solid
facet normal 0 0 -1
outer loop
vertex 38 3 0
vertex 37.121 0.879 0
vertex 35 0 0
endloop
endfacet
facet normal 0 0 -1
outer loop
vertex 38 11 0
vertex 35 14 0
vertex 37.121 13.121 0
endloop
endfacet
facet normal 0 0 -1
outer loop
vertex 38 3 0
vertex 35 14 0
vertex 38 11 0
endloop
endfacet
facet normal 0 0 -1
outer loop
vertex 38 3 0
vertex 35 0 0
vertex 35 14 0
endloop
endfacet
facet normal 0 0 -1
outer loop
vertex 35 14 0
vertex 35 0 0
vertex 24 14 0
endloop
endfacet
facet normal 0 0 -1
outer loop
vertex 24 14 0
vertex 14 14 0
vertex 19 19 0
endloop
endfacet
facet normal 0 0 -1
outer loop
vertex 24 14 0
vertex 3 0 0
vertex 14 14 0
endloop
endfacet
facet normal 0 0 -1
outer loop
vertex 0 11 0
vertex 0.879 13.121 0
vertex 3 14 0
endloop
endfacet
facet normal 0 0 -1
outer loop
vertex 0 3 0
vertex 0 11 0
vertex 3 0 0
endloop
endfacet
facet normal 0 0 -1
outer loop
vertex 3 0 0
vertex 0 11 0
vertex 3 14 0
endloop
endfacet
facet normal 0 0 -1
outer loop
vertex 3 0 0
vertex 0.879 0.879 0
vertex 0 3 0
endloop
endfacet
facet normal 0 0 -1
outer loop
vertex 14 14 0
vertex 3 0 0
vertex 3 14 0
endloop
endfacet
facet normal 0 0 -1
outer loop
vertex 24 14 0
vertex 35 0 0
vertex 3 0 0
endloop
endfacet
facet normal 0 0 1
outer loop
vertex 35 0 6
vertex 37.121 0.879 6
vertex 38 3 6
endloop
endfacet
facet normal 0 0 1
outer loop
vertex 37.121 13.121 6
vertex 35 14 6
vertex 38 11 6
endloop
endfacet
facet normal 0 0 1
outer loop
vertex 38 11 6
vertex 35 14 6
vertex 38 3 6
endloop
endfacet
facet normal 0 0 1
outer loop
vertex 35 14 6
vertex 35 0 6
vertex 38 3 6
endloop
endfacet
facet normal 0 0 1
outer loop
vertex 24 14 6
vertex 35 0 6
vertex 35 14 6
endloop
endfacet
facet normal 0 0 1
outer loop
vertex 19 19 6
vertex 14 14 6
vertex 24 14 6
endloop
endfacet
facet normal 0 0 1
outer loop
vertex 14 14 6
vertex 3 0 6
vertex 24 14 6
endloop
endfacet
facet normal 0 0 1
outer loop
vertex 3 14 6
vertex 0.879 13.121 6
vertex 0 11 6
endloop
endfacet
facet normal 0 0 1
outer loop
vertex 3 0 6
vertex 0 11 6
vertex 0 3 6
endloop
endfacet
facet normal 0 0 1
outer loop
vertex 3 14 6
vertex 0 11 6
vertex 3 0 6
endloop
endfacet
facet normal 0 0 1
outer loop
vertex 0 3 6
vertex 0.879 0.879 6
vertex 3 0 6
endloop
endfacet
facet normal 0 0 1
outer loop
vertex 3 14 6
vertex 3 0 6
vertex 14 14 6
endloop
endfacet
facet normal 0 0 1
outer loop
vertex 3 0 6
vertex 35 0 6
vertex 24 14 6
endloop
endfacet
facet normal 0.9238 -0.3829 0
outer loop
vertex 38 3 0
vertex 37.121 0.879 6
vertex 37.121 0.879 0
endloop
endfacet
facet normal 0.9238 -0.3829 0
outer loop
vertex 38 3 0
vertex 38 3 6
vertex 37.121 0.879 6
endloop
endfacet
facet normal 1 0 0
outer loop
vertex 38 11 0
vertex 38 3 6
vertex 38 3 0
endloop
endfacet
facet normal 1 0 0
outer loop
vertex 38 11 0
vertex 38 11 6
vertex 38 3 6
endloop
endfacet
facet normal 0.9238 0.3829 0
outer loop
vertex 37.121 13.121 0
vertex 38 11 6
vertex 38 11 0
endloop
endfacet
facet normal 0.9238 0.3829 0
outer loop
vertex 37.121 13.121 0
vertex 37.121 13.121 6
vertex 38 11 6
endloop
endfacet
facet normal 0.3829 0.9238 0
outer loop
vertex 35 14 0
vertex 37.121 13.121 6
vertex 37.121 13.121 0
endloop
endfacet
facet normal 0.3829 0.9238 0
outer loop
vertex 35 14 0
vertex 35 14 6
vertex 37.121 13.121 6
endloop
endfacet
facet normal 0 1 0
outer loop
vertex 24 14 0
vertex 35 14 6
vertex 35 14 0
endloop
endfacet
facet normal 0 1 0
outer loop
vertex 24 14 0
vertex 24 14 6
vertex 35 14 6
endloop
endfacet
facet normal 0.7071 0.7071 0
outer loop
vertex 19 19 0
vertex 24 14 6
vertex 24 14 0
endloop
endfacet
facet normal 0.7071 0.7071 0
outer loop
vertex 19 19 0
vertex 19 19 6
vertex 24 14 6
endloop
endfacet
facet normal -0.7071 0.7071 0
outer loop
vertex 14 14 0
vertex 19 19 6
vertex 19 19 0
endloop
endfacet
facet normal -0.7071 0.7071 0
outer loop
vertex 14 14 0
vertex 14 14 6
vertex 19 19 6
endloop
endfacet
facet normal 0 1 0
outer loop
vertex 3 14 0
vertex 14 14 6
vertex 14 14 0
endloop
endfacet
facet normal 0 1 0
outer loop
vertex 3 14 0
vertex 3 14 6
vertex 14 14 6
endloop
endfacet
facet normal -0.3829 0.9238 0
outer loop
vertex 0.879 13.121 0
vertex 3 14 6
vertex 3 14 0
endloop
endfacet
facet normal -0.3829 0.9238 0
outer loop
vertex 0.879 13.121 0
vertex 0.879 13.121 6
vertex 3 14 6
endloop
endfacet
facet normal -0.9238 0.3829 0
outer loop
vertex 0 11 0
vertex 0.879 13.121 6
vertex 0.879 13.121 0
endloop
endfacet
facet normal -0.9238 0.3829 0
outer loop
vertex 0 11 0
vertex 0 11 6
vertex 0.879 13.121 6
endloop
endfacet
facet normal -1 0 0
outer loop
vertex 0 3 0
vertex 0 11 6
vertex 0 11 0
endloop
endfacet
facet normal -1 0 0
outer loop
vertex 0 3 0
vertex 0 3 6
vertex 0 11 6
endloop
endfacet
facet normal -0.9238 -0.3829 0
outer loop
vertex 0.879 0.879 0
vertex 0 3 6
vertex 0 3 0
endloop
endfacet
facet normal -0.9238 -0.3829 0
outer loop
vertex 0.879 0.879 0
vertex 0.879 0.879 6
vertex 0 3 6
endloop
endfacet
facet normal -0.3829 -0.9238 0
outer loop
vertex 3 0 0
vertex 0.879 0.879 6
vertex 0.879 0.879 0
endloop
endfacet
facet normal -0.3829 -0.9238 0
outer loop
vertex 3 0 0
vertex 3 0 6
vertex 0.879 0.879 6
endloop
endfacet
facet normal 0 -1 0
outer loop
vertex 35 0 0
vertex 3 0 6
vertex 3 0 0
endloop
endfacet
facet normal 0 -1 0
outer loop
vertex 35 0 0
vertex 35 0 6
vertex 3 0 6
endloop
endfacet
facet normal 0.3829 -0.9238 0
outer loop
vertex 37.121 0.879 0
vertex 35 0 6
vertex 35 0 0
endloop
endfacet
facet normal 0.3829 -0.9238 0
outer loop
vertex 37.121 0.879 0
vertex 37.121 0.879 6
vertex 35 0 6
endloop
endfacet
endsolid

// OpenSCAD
$fn = 32;

// ----------------------------------------------------------------------
// Ratchet pawl: 38 x 14 mm body, beak 5 mm сверху
// ----------------------------------------------------------------------

// --- parameters (mm) ---
profile_height = 6;       // extrusion height
profile_points = 15;      // points of the closed outline

profile = [[0, 3], [0.879, 0.879], [3, 0], [35, 0], [37.121, 0.879], [38, 3], [38, 11], [37.121, 13.121], [35, 14], [24, 14], [19, 19], [14, 14], [3, 14], [0.879, 13.121], [0, 11]];  // single closed polygon, 15 points, counter clockwise

// --- the one profile operation ---
linear_extrude(height = profile_height) polygon(points = profile);
